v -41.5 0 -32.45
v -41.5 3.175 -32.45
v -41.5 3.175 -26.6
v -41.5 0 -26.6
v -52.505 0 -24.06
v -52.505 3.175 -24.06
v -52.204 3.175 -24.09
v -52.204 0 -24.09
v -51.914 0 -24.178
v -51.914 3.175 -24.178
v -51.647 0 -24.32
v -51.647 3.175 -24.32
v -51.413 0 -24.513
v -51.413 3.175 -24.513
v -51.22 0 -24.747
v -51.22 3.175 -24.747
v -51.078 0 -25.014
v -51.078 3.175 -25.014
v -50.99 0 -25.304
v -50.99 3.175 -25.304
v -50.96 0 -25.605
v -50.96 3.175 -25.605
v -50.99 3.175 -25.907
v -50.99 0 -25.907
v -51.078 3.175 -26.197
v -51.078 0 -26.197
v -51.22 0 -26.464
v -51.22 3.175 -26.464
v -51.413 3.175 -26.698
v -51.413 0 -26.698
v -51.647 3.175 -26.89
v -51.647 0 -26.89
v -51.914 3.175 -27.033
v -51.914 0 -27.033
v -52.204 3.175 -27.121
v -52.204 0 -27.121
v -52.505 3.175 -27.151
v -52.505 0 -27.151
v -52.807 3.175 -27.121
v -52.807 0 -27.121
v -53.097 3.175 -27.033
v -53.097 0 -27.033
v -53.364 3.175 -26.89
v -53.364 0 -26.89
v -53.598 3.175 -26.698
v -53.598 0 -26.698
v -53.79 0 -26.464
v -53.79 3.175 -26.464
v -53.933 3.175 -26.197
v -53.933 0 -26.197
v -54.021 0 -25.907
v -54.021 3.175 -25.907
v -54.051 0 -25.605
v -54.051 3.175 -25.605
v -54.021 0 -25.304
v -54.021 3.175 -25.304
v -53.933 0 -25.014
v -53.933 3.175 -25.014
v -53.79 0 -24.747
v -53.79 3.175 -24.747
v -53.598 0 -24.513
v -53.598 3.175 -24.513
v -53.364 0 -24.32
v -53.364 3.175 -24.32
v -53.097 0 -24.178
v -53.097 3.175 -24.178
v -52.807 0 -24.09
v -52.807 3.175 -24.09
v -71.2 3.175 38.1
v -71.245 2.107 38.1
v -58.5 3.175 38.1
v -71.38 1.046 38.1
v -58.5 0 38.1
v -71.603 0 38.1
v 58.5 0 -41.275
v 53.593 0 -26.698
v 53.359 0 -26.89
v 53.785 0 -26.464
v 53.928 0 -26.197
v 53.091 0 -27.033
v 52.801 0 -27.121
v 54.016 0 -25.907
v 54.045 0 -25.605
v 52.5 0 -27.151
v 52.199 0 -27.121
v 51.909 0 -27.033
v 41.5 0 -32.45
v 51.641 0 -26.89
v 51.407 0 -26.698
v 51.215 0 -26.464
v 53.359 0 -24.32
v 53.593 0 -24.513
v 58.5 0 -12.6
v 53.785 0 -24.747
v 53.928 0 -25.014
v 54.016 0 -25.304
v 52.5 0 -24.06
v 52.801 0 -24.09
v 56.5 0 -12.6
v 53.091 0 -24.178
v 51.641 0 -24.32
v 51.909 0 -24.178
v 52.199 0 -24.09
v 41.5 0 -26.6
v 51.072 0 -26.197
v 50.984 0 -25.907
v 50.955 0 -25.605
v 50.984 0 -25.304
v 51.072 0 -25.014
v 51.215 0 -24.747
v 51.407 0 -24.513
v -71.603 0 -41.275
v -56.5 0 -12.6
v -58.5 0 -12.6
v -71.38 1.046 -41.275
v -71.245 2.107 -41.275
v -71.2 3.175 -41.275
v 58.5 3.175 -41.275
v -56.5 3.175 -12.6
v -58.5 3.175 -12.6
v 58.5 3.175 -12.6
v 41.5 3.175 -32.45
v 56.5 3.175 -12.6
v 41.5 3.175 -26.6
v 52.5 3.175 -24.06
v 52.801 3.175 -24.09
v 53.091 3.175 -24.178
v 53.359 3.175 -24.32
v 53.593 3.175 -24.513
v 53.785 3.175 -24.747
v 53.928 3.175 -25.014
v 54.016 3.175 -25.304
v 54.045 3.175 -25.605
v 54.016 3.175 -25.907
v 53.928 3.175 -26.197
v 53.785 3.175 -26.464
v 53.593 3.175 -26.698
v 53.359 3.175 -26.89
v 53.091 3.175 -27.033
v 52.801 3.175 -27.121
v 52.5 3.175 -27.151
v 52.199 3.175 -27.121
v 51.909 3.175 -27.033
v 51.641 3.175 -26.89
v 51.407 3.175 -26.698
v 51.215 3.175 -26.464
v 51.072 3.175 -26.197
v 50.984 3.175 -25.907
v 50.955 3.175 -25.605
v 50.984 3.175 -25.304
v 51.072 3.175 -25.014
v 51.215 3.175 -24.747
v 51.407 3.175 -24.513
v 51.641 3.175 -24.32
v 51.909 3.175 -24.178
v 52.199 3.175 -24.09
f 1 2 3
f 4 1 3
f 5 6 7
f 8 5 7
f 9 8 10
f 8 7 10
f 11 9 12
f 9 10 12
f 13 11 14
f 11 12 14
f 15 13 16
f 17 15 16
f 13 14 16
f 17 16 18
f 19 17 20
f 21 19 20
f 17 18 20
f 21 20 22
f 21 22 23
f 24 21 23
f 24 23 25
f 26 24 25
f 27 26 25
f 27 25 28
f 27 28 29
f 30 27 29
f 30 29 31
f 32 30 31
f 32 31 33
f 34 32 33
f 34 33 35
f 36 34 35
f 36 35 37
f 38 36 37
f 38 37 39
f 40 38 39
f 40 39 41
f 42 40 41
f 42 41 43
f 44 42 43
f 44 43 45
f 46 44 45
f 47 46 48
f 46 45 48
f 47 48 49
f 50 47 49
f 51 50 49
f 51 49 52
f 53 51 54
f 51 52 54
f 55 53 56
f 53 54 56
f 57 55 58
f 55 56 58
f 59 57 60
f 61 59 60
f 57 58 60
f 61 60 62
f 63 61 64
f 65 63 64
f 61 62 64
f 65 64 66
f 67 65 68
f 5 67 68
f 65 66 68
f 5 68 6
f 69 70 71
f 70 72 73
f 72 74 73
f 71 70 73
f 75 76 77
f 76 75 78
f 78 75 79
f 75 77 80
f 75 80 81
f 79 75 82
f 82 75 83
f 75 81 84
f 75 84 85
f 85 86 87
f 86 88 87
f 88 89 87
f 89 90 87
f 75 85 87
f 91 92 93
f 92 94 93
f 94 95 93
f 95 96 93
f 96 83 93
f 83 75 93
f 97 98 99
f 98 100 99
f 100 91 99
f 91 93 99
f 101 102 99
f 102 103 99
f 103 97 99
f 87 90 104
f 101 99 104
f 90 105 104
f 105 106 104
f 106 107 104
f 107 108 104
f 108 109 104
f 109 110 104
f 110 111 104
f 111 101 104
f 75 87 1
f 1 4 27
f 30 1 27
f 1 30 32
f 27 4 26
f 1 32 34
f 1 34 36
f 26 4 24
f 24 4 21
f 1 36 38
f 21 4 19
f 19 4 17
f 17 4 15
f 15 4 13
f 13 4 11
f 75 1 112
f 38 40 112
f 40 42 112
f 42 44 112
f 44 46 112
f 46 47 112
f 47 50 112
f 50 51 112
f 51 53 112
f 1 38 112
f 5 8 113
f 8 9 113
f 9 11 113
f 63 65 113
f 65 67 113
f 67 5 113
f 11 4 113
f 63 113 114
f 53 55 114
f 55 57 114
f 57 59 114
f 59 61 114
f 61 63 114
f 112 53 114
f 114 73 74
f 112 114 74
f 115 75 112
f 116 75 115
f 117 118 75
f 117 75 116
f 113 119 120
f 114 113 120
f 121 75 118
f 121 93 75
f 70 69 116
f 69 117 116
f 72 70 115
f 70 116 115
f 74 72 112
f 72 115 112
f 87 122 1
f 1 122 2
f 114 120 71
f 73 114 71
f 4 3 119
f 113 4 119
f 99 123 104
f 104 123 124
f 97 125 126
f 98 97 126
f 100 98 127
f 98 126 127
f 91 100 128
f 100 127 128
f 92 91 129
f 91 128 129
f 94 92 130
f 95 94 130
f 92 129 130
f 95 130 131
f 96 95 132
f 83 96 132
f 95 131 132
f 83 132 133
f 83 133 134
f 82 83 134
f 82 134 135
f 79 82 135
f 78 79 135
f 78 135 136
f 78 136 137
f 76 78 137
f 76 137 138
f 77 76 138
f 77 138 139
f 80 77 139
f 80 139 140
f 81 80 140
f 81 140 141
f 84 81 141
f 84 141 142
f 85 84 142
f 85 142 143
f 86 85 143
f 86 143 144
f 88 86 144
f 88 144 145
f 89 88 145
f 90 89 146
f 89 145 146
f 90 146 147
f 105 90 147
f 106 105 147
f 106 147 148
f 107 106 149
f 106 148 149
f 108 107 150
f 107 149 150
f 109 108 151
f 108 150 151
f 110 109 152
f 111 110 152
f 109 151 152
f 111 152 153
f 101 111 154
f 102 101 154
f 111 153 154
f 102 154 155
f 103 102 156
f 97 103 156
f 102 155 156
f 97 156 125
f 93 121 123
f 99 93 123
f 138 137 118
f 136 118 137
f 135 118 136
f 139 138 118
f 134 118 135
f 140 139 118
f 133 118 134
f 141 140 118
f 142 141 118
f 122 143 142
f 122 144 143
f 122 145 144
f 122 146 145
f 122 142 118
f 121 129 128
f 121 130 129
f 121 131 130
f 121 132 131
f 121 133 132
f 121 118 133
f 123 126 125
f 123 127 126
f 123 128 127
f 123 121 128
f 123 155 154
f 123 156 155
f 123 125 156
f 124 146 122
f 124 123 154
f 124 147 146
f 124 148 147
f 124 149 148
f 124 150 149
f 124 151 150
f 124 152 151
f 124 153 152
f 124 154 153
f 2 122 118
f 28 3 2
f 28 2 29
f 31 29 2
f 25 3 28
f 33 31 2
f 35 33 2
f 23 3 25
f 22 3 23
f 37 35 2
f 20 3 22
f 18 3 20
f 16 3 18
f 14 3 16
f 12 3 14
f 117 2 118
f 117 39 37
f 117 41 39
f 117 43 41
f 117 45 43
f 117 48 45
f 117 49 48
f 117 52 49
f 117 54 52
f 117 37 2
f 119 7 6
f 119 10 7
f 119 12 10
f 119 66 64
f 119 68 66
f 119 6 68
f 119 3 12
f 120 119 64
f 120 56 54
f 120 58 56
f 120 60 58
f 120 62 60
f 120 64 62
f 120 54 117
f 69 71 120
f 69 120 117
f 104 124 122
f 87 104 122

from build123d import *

# Parameters (mm, degrees)
SKETCH1_W            = 152.4
SKETCH1_H            = 76.2
BOSS_EXTRUDE1_DEPTH  = 3.175
SKETCH2_R            = 1.545336663
CUT_EXTRUDE4_DEPTH   = 86.253332046
SKETCH3_W            = 134.7
SKETCH3_H            = 3.175
BOSS_EXTRUDE2_DEPTH  = 3.175
CUT_SWEEP1_PROFILE_R = 12.7


with BuildPart() as part:
    # Sketch1 → Boss-Extrude1 (new body)
    with BuildSketch(Plane(origin=(0, 0, 0), x_dir=(1, 0, 0), z_dir=(0, 1, 0))):
        Rectangle(SKETCH1_W, SKETCH1_H)
    extrude(amount=BOSS_EXTRUDE1_DEPTH)

    # Sketch2 → Cut-Extrude4 (cut, through all)
    with BuildSketch(Plane(origin=(0, 3.175, 0), x_dir=(1, 0, 0), z_dir=(0, 1, 0))):
        Polygon((-58.5, 12.6), (-58.5, -38.1), (76.2, -38.1), (76.2, 38.1), (58.5, 38.1), (58.5, 12.6), (56.5, 12.6), (41.5, 26.6), (41.5, 32.45), (-41.5, 32.45), (-41.5, 26.6), (-56.5, 12.6), align=None)
        with Locations(Location((-52.505245516, 25.605245516, 0), (0, 0, 270))):
            Circle(SKETCH2_R)
        with Locations(Location((52.5, 25.605245516, 0), (0, 0, 270))):
            Circle(SKETCH2_R)
    extrude(amount=-CUT_EXTRUDE4_DEPTH, mode=Mode.SUBTRACT)

    # Sketch3 → Boss-Extrude2 (add)
    with BuildSketch(Plane(origin=(0, 0, -38.1), x_dir=(-1, 0, 0), z_dir=(0, 0, -1))):
        with Locations((8.85, 1.5875)):
            Rectangle(SKETCH3_W, SKETCH3_H)
    extrude(amount=BOSS_EXTRUDE2_DEPTH)

    # Cut-Sweep1: sweep along a curve in space
    with BuildLine() as cut_sweep1_path:
        Line((-83.9, 3.175, 467.883912637), (-83.9, 3.175, -36.654630794))
        Line((-83.9, 3.175, -36.654630794), (-83.9, 3.175, -210.183283037))
    # Cut-Sweep1 profile (on start of the path) → Cut-Sweep1 (sweep, cut)
    with BuildSketch(Plane(origin=(-83.9, 3.175, 467.883912637), x_dir=(-1, 0, 0), z_dir=(0, 0, -1))):
        Circle(CUT_SWEEP1_PROFILE_R)
    sweep(path=cut_sweep1_path.line, mode=Mode.SUBTRACT)


solid = part.part
